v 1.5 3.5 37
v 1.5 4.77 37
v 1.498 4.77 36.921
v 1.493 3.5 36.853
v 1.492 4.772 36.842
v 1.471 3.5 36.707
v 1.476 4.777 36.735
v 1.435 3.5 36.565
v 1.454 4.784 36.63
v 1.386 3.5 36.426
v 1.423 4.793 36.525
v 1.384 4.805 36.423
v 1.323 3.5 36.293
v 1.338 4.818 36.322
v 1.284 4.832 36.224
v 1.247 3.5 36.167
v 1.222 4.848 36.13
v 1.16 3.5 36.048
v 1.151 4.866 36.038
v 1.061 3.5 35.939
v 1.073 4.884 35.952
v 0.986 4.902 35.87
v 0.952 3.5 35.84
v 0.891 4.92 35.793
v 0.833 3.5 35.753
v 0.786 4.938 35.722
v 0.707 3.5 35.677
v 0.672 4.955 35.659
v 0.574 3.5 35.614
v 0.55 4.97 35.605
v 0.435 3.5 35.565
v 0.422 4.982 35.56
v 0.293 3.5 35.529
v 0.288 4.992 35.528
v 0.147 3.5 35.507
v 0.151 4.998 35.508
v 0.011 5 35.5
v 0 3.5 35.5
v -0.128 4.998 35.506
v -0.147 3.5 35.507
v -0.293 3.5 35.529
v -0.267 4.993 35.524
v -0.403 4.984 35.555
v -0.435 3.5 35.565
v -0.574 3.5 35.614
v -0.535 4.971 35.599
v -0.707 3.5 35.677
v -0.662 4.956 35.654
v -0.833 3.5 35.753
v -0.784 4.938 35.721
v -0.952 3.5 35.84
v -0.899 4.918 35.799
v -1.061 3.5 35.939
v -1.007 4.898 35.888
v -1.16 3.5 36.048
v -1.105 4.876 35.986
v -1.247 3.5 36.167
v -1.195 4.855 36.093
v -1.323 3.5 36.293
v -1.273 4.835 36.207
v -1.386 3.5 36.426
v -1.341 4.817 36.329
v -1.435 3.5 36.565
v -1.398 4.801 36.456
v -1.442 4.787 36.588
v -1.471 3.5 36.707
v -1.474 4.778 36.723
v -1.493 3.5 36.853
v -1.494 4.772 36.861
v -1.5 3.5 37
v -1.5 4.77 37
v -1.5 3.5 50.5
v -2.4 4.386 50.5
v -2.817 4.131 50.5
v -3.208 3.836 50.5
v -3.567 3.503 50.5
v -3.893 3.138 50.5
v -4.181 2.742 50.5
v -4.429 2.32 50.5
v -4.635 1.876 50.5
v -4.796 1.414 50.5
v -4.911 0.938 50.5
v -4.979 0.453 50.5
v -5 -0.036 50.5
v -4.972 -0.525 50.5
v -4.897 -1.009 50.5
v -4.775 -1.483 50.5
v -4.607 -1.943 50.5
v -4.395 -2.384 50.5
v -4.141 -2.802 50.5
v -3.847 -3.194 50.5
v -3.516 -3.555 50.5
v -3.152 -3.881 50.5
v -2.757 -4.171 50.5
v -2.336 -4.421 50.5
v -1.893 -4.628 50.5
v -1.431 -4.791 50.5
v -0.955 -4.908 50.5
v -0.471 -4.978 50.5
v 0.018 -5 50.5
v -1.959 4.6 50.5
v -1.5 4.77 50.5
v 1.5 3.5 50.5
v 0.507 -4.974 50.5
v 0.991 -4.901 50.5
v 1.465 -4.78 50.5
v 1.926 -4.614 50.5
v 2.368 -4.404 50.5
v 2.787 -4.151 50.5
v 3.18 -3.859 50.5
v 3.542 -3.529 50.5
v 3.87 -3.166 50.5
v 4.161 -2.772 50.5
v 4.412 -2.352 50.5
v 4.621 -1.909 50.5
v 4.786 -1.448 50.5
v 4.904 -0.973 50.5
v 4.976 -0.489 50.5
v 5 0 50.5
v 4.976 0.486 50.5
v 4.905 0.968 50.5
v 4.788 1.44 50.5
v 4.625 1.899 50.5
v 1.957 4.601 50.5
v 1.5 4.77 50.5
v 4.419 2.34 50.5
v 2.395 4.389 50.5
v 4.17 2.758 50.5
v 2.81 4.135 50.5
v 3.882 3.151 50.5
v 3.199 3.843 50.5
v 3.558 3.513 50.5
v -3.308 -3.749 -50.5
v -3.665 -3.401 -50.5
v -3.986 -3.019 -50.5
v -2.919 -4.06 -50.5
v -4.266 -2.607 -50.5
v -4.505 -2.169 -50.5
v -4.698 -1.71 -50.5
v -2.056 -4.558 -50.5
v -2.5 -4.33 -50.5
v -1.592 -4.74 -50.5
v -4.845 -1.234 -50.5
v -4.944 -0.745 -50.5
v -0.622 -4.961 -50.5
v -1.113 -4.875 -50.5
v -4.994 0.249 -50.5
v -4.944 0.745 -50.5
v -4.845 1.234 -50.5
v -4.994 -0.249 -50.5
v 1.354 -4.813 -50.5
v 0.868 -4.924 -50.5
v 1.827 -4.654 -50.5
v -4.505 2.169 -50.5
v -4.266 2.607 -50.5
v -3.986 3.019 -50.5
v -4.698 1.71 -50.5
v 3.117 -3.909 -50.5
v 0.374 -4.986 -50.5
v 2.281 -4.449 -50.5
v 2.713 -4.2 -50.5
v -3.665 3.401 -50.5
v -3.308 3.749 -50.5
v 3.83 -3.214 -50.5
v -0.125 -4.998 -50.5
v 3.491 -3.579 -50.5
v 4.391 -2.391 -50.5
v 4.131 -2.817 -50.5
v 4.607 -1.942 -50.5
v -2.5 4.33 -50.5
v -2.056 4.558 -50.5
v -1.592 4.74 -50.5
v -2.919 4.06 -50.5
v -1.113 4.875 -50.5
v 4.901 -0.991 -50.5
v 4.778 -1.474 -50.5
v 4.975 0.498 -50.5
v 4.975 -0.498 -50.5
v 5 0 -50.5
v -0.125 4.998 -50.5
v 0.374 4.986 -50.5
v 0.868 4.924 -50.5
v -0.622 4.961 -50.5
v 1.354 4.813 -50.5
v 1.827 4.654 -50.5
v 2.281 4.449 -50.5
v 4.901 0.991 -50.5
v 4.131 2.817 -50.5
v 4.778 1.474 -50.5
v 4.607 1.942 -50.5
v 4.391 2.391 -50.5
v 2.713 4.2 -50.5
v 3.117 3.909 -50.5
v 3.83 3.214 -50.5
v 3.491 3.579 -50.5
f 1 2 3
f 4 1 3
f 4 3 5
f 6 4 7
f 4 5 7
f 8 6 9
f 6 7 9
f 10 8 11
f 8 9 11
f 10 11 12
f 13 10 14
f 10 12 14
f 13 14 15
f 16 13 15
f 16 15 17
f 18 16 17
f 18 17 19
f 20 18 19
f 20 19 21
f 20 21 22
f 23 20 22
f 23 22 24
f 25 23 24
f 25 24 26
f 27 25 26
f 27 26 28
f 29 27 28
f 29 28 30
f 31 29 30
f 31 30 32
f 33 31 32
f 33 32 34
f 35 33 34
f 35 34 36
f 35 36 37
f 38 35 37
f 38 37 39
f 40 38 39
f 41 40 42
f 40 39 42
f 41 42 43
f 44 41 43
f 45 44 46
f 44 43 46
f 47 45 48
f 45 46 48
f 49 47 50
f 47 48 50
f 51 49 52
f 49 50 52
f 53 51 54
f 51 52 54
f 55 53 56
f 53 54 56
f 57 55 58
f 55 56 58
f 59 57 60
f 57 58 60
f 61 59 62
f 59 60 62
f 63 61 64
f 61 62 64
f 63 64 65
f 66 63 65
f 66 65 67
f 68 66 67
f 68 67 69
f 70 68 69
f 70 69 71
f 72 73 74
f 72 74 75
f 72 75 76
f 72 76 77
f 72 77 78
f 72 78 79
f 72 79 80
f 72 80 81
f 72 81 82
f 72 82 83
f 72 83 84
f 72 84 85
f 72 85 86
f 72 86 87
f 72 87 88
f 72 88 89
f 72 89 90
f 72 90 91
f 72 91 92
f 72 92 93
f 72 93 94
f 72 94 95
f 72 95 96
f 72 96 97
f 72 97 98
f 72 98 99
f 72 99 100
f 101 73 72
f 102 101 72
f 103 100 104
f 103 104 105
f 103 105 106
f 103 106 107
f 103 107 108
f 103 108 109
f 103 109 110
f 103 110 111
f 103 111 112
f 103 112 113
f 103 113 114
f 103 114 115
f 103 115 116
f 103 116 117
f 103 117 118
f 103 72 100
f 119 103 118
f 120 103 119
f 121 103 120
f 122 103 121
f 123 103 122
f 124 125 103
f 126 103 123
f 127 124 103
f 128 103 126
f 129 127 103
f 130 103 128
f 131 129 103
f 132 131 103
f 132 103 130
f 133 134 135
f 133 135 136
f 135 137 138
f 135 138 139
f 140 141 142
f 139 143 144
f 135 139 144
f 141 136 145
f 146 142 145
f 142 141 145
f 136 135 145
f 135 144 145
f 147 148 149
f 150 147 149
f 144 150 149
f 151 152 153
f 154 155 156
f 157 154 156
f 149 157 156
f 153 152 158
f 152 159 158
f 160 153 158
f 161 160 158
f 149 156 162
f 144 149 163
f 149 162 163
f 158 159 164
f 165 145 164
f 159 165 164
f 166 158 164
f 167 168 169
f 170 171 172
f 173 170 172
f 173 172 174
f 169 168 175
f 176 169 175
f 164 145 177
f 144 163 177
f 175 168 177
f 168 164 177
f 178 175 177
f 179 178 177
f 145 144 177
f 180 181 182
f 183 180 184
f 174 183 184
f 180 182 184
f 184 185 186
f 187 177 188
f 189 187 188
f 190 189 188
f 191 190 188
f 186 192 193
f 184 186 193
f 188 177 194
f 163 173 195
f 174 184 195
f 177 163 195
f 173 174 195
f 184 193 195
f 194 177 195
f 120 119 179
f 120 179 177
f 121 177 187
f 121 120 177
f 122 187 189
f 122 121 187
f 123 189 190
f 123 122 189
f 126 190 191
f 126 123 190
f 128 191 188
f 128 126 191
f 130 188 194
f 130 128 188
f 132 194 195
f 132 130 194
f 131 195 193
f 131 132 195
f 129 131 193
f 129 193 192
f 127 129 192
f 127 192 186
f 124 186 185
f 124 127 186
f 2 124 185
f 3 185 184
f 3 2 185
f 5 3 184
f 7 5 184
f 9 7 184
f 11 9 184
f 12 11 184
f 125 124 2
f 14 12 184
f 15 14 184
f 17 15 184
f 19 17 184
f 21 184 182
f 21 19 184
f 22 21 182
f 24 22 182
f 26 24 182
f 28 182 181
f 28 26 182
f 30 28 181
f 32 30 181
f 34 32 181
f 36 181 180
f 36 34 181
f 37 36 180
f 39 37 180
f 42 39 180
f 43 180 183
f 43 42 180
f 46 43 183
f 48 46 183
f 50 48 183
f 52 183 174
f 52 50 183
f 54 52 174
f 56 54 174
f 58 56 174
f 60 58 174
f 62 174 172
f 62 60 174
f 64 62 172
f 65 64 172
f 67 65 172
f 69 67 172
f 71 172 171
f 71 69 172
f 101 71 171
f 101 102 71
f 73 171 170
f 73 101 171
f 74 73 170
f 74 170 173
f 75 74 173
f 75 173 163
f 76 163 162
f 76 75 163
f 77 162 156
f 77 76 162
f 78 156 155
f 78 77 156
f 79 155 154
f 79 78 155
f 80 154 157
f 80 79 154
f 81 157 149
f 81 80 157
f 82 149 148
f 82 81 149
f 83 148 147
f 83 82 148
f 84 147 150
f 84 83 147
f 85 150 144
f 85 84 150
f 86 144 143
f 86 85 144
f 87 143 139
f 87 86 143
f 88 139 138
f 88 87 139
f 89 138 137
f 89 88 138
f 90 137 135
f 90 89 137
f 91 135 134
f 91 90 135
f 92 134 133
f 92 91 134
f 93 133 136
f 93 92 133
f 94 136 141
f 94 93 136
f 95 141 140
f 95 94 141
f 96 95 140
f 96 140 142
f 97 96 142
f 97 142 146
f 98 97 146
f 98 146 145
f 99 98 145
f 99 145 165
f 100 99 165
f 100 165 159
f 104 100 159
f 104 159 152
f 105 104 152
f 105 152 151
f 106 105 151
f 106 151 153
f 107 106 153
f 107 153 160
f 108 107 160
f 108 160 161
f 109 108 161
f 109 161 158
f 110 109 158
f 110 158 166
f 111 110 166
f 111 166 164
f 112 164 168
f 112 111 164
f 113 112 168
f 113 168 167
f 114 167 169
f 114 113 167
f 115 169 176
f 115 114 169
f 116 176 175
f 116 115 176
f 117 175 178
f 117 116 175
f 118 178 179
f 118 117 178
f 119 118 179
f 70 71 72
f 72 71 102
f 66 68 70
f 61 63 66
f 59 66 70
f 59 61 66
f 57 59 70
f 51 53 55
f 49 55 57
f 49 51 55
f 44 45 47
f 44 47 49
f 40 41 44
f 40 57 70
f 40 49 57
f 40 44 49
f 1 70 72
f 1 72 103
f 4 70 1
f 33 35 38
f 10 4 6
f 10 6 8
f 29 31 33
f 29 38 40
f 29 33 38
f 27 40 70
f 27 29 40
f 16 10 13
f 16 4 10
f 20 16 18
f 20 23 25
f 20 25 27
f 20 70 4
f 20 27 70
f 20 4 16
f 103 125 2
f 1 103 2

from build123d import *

# Parameters (mm, degrees)
SKETCH1_R           = 5
BOSS_EXTRUDE1_DEPTH = 50.5
CUT_EXTRUDE1_START  = 5
CUT_EXTRUDE1_DEPTH  = 1.5


with BuildPart() as part:
    # Sketch1 → Boss-Extrude1 (new, symmetric)
    with BuildSketch(Plane.XY):
        Circle(SKETCH1_R)
    extrude(amount=BOSS_EXTRUDE1_DEPTH, both=True)

    # Sketch2 → Cut-Extrude1 (cut)
    with BuildSketch(Plane(origin=(0, 0, 0), x_dir=(1, 0, 0), z_dir=(0, 1, 0)).offset(CUT_EXTRUDE1_START)):
        with BuildLine():
            Line((-1.5, -37), (-1.5, -50.5))
            Line((-1.5, -50.5), (1.5, -50.5))
            Line((1.5, -50.5), (1.5, -37))
            ThreePointArc((1.5, -37), (0, -35.5), (-1.5, -37))
        make_face()
    extrude(amount=-CUT_EXTRUDE1_DEPTH, mode=Mode.SUBTRACT)


solid = part.part
